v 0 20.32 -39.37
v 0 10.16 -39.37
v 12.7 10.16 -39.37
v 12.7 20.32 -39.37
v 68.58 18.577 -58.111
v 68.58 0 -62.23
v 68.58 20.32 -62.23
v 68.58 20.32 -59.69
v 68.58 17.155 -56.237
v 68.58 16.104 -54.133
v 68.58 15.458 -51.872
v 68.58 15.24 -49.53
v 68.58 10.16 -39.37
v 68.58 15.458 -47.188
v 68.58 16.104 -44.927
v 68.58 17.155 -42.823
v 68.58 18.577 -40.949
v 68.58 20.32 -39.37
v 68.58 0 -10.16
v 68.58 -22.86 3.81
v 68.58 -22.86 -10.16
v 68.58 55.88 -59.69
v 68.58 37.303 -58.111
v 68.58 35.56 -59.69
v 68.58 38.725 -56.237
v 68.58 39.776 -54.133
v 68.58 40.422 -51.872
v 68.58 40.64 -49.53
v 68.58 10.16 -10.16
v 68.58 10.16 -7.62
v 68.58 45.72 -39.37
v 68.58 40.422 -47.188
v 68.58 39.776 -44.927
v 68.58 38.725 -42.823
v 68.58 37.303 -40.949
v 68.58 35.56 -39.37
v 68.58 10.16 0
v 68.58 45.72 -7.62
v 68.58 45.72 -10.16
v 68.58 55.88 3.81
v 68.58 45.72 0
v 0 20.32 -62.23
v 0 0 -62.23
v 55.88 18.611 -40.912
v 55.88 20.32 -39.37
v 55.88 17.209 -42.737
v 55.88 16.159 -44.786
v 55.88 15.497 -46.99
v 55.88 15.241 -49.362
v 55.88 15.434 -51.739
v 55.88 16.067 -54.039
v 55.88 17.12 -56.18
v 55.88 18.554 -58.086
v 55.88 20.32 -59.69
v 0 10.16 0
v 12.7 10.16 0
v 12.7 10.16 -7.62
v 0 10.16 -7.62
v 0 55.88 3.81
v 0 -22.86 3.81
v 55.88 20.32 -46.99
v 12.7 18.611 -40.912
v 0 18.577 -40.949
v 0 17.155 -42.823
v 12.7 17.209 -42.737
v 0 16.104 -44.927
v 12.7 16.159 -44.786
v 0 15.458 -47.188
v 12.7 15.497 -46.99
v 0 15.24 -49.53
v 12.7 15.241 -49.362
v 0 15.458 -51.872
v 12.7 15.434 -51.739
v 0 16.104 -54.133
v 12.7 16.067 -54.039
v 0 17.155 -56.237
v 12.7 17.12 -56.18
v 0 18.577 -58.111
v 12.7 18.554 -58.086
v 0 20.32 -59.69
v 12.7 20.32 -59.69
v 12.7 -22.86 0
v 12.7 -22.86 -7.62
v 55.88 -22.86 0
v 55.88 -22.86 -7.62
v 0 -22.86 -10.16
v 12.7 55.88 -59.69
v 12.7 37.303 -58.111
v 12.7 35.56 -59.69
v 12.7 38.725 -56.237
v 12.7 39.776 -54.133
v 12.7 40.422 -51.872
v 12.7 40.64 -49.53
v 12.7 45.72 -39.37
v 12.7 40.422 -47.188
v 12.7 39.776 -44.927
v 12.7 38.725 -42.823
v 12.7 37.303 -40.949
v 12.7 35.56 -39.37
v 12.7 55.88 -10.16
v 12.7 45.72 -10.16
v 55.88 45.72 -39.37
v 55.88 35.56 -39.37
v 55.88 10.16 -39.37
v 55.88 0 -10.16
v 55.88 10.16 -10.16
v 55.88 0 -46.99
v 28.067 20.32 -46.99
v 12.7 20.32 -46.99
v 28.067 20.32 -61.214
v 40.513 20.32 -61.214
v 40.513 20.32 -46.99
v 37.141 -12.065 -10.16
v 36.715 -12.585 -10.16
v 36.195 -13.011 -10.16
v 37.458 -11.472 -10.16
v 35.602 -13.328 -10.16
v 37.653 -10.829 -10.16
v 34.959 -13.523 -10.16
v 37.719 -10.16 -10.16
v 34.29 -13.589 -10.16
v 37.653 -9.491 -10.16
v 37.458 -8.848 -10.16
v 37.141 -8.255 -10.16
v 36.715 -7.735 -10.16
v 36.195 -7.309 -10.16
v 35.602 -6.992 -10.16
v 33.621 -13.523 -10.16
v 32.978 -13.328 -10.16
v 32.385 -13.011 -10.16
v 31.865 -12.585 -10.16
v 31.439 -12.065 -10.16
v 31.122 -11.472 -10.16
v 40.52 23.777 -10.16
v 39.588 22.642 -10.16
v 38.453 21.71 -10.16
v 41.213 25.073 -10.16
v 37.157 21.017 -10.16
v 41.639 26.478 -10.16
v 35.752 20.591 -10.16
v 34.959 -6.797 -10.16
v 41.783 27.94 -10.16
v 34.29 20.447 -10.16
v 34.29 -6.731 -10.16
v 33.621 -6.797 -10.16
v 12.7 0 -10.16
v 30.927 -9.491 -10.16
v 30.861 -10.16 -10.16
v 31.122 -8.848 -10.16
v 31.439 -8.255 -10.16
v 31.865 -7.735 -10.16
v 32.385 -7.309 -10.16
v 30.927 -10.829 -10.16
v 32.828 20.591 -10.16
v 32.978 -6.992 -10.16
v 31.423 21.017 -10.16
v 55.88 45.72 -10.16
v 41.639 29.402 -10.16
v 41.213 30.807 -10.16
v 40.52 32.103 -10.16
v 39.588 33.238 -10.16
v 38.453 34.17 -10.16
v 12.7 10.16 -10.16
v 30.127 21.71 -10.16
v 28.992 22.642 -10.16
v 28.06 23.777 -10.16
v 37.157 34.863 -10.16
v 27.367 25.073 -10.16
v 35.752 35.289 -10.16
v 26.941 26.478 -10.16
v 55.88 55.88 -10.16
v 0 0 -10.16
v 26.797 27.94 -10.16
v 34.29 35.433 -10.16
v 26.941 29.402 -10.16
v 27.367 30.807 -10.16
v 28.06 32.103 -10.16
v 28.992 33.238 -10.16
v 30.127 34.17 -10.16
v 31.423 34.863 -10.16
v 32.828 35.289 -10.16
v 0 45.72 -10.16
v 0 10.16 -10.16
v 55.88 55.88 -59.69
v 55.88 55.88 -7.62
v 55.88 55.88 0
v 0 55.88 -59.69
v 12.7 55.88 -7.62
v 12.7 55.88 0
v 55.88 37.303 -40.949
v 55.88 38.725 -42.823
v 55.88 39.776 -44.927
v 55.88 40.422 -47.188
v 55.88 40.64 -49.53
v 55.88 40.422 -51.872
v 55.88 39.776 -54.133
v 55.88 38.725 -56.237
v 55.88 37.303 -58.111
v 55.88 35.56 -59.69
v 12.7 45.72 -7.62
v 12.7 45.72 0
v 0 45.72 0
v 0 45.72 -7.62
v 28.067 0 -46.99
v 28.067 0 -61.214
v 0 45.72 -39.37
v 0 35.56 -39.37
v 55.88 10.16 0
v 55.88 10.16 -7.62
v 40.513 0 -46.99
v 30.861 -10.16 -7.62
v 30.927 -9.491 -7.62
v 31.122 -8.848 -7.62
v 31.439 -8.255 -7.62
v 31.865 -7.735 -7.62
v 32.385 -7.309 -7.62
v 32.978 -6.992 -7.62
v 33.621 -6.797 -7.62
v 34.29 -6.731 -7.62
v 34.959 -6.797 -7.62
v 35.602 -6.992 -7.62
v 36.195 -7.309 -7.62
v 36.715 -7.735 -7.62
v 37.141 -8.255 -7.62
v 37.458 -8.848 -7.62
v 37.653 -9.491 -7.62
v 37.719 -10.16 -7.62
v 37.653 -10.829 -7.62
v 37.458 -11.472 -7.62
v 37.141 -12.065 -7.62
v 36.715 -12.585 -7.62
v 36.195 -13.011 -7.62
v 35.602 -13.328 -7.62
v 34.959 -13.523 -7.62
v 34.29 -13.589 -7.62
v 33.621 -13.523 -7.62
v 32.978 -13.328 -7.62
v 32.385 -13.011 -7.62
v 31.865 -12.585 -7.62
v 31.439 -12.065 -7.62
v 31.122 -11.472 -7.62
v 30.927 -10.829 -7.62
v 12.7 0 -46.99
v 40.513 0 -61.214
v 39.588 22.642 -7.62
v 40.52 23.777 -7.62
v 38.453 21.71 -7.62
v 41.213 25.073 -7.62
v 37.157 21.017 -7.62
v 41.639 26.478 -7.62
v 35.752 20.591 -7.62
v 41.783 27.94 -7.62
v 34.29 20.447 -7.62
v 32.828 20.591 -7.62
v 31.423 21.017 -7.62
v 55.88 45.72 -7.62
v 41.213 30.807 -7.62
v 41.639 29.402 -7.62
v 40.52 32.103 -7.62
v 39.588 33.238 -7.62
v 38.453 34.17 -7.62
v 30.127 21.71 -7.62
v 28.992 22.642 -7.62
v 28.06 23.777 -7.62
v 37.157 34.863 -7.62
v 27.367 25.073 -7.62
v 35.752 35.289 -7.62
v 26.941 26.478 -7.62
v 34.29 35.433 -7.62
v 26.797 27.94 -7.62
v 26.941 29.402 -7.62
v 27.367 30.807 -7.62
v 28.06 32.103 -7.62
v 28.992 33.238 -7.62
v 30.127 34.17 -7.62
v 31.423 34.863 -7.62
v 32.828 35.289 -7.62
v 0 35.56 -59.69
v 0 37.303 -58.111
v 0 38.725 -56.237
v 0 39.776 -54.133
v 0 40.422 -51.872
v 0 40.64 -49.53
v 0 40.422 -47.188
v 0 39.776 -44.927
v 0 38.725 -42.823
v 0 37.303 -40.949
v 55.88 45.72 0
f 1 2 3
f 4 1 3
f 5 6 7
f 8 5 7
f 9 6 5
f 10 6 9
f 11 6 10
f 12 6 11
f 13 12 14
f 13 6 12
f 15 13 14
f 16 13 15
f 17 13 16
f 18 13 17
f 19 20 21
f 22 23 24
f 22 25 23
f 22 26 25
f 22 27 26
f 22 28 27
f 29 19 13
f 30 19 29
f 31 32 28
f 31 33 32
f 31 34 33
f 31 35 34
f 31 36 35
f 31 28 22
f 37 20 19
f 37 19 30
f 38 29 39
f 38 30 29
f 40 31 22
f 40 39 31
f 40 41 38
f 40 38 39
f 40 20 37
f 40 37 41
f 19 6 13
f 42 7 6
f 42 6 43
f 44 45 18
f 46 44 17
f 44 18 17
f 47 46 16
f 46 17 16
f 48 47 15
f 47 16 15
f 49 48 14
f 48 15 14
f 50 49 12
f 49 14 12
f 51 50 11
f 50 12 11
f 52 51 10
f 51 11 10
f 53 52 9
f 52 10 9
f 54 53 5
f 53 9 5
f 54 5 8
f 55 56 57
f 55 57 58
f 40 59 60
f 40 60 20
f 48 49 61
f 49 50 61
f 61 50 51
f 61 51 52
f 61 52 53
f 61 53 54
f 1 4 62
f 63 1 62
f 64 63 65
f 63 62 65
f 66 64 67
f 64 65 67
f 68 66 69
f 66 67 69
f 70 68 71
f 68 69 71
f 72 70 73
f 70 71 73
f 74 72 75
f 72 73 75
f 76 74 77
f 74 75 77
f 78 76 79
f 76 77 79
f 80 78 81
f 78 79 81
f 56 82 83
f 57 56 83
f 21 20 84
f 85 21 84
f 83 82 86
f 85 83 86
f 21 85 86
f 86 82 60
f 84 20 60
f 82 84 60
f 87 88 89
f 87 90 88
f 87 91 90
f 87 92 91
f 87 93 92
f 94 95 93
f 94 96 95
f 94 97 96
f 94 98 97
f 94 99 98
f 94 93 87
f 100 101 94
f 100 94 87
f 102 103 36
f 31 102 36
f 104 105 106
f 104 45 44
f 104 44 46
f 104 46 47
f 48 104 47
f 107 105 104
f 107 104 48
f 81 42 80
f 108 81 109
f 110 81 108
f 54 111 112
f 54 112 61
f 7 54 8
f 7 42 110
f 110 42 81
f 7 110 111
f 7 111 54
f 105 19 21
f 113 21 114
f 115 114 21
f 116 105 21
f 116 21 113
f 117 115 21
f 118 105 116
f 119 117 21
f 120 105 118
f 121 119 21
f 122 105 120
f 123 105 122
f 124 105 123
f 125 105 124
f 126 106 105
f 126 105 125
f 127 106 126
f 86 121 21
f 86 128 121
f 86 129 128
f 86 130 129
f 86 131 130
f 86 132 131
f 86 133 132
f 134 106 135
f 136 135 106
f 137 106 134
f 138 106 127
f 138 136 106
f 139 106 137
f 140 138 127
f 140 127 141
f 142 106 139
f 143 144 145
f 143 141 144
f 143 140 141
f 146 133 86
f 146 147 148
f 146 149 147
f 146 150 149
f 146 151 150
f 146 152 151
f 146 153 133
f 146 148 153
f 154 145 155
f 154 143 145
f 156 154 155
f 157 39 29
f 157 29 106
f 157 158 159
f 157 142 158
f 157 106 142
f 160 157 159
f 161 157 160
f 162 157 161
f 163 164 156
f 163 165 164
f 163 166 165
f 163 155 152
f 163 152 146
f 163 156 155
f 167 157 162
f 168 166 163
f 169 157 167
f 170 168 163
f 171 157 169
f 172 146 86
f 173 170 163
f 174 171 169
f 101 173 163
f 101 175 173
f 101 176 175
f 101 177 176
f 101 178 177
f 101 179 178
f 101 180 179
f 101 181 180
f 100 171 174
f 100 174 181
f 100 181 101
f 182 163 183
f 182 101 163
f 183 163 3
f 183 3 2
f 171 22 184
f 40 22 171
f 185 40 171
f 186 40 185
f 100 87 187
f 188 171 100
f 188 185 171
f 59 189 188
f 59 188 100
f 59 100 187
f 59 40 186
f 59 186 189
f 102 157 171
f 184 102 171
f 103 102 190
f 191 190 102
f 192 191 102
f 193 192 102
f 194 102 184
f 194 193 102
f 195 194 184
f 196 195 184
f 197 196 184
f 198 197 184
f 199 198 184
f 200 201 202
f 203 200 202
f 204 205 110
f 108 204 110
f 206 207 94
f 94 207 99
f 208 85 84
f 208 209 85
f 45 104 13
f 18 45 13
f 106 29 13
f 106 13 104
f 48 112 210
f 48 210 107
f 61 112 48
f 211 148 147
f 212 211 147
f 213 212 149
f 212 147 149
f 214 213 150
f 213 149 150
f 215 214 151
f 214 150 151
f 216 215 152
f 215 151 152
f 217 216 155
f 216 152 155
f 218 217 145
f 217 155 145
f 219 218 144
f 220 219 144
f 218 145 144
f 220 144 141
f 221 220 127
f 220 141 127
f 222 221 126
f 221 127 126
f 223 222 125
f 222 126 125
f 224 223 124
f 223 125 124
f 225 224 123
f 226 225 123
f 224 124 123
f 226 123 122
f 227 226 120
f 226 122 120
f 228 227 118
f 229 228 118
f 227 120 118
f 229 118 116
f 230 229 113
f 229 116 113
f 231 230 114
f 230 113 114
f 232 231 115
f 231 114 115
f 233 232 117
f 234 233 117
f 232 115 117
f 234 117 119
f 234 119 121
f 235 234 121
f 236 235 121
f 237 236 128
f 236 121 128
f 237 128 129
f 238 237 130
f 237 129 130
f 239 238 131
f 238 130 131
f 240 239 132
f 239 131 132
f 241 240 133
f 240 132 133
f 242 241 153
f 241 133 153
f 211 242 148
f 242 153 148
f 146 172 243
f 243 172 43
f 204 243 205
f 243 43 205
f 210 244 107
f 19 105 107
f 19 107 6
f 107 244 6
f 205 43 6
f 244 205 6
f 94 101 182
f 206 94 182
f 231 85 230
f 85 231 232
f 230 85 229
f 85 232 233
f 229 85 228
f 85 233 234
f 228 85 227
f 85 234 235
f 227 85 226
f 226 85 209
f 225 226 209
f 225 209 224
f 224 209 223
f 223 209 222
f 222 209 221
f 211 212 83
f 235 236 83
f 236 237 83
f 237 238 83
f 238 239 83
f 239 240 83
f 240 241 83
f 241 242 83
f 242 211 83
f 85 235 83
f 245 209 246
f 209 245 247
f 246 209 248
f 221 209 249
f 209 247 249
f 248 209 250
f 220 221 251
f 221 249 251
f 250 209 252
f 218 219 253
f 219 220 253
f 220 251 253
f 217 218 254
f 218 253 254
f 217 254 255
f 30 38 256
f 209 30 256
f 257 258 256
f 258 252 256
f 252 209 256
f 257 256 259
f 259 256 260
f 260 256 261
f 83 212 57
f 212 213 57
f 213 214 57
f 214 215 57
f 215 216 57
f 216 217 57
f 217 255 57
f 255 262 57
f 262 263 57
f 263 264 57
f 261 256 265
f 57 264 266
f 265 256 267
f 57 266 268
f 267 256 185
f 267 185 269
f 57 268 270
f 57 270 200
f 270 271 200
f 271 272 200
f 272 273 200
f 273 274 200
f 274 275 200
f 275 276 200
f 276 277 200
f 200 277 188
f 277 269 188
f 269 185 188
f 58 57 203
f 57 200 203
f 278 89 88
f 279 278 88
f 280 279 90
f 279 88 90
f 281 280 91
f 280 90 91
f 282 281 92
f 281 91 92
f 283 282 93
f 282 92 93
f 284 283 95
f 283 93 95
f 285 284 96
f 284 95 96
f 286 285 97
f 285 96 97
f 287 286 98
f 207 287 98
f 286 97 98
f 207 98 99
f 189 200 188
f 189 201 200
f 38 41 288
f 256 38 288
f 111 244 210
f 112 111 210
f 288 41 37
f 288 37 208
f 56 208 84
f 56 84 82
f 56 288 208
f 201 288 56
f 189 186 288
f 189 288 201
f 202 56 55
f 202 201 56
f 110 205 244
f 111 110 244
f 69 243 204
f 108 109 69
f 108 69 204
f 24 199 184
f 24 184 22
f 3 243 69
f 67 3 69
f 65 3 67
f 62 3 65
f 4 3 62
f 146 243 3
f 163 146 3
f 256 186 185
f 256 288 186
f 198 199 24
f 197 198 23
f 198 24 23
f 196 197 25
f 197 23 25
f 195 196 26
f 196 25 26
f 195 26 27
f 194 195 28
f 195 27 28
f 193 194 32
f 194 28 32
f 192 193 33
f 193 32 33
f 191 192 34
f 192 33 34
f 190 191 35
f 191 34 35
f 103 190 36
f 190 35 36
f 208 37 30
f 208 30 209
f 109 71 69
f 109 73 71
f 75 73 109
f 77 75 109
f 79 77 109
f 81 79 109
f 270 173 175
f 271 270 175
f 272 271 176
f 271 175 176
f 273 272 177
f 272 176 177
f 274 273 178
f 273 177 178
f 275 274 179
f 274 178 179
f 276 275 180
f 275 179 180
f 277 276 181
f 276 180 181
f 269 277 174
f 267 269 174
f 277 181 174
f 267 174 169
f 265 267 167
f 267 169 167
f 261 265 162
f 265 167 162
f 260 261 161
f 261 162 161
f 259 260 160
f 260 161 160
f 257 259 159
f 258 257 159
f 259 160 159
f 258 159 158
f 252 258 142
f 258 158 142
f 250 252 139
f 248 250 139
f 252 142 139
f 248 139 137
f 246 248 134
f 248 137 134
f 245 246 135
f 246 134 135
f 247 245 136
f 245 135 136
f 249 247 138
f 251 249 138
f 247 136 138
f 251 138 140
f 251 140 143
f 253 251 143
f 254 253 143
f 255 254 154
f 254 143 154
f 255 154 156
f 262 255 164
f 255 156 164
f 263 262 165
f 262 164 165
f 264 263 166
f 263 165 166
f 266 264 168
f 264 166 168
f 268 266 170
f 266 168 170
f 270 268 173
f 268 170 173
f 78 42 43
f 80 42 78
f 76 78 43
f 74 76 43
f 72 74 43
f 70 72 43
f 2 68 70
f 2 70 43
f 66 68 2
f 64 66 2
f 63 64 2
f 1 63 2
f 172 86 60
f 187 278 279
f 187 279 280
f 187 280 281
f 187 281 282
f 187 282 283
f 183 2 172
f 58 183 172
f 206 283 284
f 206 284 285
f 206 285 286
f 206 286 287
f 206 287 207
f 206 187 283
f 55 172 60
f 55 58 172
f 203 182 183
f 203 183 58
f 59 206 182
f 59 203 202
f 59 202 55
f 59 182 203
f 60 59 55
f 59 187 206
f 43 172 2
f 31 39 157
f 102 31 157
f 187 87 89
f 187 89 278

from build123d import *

# Parameters (mm, degrees)
SKETCH1_W           = 68.58
SKETCH1_H           = 55.88
BOSS_EXTRUDE1_DEPTH = 3.81
SKETCH2_W           = 12.7
SKETCH2_H           = 10.16
BOSS_EXTRUDE2_DEPTH = 59.69
SKETCH6_W           = 12.7
SKETCH6_H           = 20.32
BOSS_EXTRUDE3_DEPTH = 35.56
SKETCH4_R           = 12.7
CUT_EXTRUDE1_DEPTH  = 107.717790925
SKETCH7_W           = 68.58
SKETCH7_H           = 55.88
SKETCH7_W_2         = 43.18
SKETCH7_H_2         = 22.86
BOSS_EXTRUDE4_DEPTH = 2.54
SKETCH8_R           = 3.429
SKETCH8_R_2         = 7.493
CUT_EXTRUDE2_DEPTH  = 2.54
SKETCH9_W           = 68.58
SKETCH9_H           = 20.32
BOSS_EXTRUDE5_DEPTH = 2.54
CUT_EXTRUDE3_REACH  = 110.159
SKETCH10_W          = 12.446
SKETCH10_H          = 3.048
SKETCH11_W          = 15.367
SKETCH11_H          = 20.32
BOSS_EXTRUDE6_DEPTH = 12.7
BOSS_EXTRUDE7_DEPTH = 22.86


with BuildPart() as part:
    # Sketch1 → Boss-Extrude1 (new body)
    with BuildSketch(Plane.XY):
        with Locations((34.29, 27.94)):
            Rectangle(SKETCH1_W, SKETCH1_H)
    extrude(amount=BOSS_EXTRUDE1_DEPTH)

    # Sketch2 → Boss-Extrude2 (add)
    with BuildSketch(Plane(origin=(0, 0, 0), x_dir=(-1, 0, 0), z_dir=(0, 0, -1))):
        with Locations((-62.23, 50.8)):
            Rectangle(SKETCH2_W, SKETCH2_H)
        with Locations((-6.35, 50.8)):
            Rectangle(SKETCH2_W, SKETCH2_H)
        with Locations((-6.35, 5.08)):
            Rectangle(SKETCH2_W, SKETCH2_H)
        with Locations((-62.23, 5.08)):
            Rectangle(SKETCH2_W, SKETCH2_H)
    extrude(amount=BOSS_EXTRUDE2_DEPTH)

    # Sketch6 → Boss-Extrude3 (add)
    with BuildSketch(Plane(origin=(0, 10.16, 0), x_dir=(1, 0, 0), z_dir=(0, 1, 0))):
        with Locations((62.23, 49.53)):
            Rectangle(SKETCH6_W, SKETCH6_H)
        with Locations((6.35, 49.53)):
            Rectangle(SKETCH6_W, SKETCH6_H)
    extrude(amount=BOSS_EXTRUDE3_DEPTH)

    # Sketch4 → Cut-Extrude1 (cut, through all)
    with BuildSketch(Plane(origin=(68.58, 0, 0), x_dir=(0, 0, -1), z_dir=(1, 0, 0))):
        with Locations((49.53, 27.94)):
            Circle(SKETCH4_R)
    extrude(amount=-CUT_EXTRUDE1_DEPTH, mode=Mode.SUBTRACT)

    # Sketch7 → Boss-Extrude4 (add)
    with BuildSketch(Plane(origin=(0, 0, -7.62), x_dir=(-1, 0, 0), z_dir=(0, 0, -1))):
        with Locations((-34.29, 27.94)):
            Rectangle(SKETCH7_W, SKETCH7_H)
        with Locations((-34.29, -11.43)):
            Rectangle(SKETCH7_W_2, SKETCH7_H_2)
    extrude(amount=BOSS_EXTRUDE4_DEPTH)

    # Sketch8 → Cut-Extrude2 (cut)
    with BuildSketch(Plane(origin=(0, 0, -10.16), x_dir=(-1, 0, 0), z_dir=(0, 0, -1))):
        with Locations((-34.29, -10.16)):
            Circle(SKETCH8_R)
        with Locations((-34.29, 27.94)):
            Circle(SKETCH8_R_2)
    extrude(amount=-CUT_EXTRUDE2_DEPTH, mode=Mode.SUBTRACT)

    # Sketch9 → Boss-Extrude5 (add)
    with BuildSketch(Plane(origin=(0, 0, -59.69), x_dir=(-1, 0, 0), z_dir=(0, 0, -1))):
        with Locations((-34.29, 10.16)):
            Rectangle(SKETCH9_W, SKETCH9_H)
    extrude(amount=BOSS_EXTRUDE5_DEPTH)

    # Sketch10 → Cut-Extrude3 (cut, up to next)
    with BuildSketch(Plane.XZ, mode=Mode.PRIVATE) as cut_extrude3_sk1:
        with Locations((34.29, -59.69)):
            Rectangle(SKETCH10_W, SKETCH10_H)
    cut_extrude3_tool1 = extrude(cut_extrude3_sk1.sketch, amount=-CUT_EXTRUDE3_REACH, mode=Mode.PRIVATE) & part.part
    add(cut_extrude3_tool1.solids().sort_by_distance((34.29, 0, -59.69))[0], mode=Mode.SUBTRACT)

    # Sketch11 → Boss-Extrude6 (add)
    with BuildSketch(Plane.XY.offset(-59.69)):
        with Locations((20.3835, 10.16)):
            Rectangle(SKETCH11_W, SKETCH11_H)
        with Locations((48.1965, 10.16)):
            Rectangle(SKETCH11_W, SKETCH11_H)
    extrude(amount=BOSS_EXTRUDE6_DEPTH)

    # Sketch12 → Boss-Extrude7 (add)
    with BuildSketch(Plane.XZ):
        Polygon((12.7, -10.16), (0, -10.16), (0, 3.81), (68.58, 3.81), (68.58, -10.16), (55.88, -10.16), (55.88, 0), (12.7, 0), align=None)
    extrude(amount=BOSS_EXTRUDE7_DEPTH)


solid = part.part
